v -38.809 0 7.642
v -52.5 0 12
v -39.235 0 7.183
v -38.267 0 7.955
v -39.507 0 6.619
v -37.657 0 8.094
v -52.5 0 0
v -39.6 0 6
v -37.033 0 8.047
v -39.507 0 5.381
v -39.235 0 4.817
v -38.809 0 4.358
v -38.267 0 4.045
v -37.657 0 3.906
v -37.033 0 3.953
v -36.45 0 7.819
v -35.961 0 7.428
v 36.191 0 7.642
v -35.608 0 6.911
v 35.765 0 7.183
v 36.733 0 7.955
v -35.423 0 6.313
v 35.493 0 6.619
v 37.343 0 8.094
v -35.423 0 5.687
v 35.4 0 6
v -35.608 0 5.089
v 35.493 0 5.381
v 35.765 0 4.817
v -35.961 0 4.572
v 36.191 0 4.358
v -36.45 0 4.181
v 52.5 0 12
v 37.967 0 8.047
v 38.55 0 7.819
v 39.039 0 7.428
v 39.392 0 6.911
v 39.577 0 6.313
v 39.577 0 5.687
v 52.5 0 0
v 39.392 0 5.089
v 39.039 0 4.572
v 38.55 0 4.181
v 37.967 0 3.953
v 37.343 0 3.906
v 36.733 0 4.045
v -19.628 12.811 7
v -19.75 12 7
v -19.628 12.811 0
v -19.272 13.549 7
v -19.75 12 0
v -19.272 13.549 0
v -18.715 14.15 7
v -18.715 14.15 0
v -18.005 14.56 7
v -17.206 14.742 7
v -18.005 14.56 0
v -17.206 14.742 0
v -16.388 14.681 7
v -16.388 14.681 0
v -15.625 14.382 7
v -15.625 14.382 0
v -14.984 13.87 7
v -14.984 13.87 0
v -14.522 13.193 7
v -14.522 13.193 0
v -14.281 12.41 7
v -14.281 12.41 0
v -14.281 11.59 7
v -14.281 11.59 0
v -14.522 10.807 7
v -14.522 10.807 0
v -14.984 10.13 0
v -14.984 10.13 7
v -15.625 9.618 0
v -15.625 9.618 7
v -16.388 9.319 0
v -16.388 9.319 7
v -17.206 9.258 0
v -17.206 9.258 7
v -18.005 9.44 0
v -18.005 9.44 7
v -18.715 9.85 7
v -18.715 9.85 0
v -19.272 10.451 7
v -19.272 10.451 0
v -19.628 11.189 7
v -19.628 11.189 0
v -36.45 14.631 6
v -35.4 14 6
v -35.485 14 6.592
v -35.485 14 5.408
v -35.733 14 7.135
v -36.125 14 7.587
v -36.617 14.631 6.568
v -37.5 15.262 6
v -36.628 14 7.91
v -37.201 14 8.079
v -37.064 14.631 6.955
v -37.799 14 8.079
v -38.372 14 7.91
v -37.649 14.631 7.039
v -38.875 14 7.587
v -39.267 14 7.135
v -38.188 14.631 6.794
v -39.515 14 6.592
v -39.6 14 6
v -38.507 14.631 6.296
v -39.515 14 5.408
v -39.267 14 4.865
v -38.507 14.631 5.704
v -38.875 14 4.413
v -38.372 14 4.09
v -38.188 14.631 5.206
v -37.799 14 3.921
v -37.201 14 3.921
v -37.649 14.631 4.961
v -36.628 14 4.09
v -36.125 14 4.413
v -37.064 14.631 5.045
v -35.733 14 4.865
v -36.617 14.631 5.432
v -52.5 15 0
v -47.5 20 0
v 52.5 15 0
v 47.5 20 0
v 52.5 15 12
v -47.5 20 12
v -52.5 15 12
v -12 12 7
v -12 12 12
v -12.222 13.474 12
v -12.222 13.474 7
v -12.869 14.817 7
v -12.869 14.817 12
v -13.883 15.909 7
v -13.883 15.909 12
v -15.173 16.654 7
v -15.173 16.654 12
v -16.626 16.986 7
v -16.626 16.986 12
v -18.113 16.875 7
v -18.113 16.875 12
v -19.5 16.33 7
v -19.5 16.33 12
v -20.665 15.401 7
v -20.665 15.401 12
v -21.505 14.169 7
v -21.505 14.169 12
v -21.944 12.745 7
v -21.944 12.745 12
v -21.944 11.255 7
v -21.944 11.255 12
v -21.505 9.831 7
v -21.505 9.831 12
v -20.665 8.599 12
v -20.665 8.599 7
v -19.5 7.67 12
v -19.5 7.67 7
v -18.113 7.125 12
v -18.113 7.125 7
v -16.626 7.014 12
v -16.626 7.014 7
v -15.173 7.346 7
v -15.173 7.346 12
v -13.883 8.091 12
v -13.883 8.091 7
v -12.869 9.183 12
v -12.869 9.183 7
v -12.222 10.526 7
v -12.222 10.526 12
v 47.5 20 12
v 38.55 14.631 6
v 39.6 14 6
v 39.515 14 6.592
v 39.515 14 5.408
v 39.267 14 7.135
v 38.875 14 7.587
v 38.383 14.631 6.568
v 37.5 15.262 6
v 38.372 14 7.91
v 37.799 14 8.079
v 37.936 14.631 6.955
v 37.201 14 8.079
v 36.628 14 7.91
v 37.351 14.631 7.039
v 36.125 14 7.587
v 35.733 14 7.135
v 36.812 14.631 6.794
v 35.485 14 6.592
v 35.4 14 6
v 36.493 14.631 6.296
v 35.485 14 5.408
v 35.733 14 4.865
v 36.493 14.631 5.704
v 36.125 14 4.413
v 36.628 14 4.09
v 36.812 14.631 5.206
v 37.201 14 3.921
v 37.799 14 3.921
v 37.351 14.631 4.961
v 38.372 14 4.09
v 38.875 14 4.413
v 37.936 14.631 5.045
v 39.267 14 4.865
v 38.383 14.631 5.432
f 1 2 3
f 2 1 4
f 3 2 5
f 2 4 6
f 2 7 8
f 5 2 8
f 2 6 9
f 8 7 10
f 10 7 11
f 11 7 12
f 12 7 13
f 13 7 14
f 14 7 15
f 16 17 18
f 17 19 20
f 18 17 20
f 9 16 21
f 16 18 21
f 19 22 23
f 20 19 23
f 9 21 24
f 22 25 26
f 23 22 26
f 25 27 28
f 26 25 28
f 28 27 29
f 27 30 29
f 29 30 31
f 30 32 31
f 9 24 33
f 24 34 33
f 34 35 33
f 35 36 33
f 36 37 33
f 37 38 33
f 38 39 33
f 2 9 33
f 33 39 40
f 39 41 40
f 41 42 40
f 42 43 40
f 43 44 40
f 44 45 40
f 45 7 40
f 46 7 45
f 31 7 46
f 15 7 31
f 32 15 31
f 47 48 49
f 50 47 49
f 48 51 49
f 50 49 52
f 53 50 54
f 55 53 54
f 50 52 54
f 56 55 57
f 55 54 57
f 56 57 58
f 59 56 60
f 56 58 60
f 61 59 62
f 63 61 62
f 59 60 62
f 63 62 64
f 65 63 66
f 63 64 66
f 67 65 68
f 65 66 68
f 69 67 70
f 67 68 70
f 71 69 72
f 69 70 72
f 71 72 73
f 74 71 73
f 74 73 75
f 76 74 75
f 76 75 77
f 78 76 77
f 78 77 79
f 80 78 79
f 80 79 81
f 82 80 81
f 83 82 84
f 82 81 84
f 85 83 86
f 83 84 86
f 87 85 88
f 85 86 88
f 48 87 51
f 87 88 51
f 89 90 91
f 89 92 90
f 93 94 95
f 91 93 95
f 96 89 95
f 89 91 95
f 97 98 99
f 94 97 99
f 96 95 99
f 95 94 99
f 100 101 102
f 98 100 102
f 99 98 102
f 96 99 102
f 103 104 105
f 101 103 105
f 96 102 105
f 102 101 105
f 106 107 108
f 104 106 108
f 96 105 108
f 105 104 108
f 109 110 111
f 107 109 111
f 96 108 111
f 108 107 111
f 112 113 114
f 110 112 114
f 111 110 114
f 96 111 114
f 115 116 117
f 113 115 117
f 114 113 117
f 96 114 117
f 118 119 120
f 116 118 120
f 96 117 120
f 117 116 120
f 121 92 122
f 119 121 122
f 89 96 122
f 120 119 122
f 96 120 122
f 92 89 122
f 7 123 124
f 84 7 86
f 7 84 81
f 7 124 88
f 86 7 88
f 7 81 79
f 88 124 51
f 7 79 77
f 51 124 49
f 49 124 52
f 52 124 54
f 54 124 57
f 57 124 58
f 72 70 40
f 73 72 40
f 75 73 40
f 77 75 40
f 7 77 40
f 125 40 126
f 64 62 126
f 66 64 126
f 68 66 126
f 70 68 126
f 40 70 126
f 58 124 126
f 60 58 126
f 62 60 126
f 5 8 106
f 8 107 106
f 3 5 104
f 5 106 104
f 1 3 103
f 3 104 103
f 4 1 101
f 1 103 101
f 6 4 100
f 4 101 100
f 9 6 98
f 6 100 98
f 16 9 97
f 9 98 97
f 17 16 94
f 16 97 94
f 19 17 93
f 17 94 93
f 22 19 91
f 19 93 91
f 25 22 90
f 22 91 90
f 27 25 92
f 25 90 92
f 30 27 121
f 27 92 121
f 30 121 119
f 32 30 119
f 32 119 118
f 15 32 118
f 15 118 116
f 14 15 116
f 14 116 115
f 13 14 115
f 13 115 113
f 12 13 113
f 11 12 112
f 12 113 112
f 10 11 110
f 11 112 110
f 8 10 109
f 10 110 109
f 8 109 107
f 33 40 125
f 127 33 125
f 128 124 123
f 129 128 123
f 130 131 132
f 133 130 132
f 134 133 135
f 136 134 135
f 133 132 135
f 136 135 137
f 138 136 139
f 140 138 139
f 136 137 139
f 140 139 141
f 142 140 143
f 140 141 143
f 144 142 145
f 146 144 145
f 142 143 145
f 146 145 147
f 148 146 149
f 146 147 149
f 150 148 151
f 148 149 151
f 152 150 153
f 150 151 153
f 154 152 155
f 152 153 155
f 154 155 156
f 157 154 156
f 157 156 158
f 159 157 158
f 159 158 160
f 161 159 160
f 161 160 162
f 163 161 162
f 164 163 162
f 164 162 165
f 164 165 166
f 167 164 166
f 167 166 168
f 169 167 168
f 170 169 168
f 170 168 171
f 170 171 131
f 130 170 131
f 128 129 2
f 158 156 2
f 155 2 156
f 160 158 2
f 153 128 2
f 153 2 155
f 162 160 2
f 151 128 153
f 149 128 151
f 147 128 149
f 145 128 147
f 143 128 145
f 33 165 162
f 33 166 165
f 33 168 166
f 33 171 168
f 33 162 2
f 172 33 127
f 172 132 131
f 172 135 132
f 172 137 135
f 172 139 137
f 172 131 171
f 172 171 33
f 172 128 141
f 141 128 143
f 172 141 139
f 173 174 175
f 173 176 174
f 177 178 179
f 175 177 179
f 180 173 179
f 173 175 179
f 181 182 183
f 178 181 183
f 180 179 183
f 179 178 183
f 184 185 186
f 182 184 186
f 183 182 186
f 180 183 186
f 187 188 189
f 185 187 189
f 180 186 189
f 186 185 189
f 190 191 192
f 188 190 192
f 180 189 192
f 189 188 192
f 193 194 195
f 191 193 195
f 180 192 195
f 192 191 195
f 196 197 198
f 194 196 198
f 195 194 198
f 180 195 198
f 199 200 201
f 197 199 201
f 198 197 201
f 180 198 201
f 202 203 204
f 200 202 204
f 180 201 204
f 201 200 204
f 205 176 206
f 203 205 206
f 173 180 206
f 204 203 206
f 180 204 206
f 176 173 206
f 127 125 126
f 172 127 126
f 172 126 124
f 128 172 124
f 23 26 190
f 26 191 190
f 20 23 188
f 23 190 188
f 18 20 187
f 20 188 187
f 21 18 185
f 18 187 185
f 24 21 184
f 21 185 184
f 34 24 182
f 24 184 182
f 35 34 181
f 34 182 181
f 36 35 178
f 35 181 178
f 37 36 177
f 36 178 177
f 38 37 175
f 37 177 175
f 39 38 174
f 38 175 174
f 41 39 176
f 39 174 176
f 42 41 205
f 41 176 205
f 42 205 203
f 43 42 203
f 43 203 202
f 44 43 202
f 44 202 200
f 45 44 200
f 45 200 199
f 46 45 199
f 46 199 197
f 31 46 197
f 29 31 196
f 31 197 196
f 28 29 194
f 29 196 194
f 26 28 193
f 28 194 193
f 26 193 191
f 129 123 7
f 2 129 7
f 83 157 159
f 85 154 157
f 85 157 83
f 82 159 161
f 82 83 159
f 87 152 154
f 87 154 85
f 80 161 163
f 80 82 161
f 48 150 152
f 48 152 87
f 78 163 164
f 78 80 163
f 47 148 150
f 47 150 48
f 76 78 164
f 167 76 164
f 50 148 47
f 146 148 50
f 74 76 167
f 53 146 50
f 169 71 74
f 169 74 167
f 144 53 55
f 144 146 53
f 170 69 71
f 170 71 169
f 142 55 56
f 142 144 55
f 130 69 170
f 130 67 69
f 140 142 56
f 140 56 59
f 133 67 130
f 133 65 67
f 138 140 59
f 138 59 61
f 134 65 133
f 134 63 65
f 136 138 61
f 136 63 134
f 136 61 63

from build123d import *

# Parameters (mm, degrees)
BOSS_EXTRUDE1_DEPTH                             = 12
CBORE_FOR_M5_SOCKET_HEAD_CAP_SCREW1_D           = 5.5
CBORE_FOR_M5_SOCKET_HEAD_CAP_SCREW1_CBORE_D     = 10
CBORE_FOR_M5_SOCKET_HEAD_CAP_SCREW1_CBORE_DEPTH = 5
M5X0_8_TAPPED_HOLE1_D                           = 4.2
M5X0_8_TAPPED_HOLE1_DEPTH                       = 14
M5X0_8_TAPPED_HOLE1_TIP                         = 1.2618073


with BuildPart() as part:
    # Sketch1 → Boss-Extrude1 (new body)
    with BuildSketch(Plane.XY):
        Polygon((-47.5, 20), (-52.5, 15), (-52.5, 0), (52.5, 0), (52.5, 15), (47.5, 20), align=None)
    extrude(amount=BOSS_EXTRUDE1_DEPTH)

    # CBORE for M5 Socket Head Cap Screw1 (through all)
    with Locations(Plane.XY.offset(12)):
        with Locations((-17, 12)):
            CounterBoreHole(CBORE_FOR_M5_SOCKET_HEAD_CAP_SCREW1_D / 2, CBORE_FOR_M5_SOCKET_HEAD_CAP_SCREW1_CBORE_D / 2, CBORE_FOR_M5_SOCKET_HEAD_CAP_SCREW1_CBORE_DEPTH)

    # M5x0.8 Tapped Hole1
    with Locations(Plane.XZ):
        with Locations((-37.5, 6), (37.5, 6)):
            Hole(M5X0_8_TAPPED_HOLE1_D / 2, depth=M5X0_8_TAPPED_HOLE1_DEPTH)
            with Locations((0, 0, -(M5X0_8_TAPPED_HOLE1_DEPTH + M5X0_8_TAPPED_HOLE1_TIP / 2))):  # 118° drill point
                Cone(0, M5X0_8_TAPPED_HOLE1_D / 2, M5X0_8_TAPPED_HOLE1_TIP, mode=Mode.SUBTRACT)


solid = part.part
